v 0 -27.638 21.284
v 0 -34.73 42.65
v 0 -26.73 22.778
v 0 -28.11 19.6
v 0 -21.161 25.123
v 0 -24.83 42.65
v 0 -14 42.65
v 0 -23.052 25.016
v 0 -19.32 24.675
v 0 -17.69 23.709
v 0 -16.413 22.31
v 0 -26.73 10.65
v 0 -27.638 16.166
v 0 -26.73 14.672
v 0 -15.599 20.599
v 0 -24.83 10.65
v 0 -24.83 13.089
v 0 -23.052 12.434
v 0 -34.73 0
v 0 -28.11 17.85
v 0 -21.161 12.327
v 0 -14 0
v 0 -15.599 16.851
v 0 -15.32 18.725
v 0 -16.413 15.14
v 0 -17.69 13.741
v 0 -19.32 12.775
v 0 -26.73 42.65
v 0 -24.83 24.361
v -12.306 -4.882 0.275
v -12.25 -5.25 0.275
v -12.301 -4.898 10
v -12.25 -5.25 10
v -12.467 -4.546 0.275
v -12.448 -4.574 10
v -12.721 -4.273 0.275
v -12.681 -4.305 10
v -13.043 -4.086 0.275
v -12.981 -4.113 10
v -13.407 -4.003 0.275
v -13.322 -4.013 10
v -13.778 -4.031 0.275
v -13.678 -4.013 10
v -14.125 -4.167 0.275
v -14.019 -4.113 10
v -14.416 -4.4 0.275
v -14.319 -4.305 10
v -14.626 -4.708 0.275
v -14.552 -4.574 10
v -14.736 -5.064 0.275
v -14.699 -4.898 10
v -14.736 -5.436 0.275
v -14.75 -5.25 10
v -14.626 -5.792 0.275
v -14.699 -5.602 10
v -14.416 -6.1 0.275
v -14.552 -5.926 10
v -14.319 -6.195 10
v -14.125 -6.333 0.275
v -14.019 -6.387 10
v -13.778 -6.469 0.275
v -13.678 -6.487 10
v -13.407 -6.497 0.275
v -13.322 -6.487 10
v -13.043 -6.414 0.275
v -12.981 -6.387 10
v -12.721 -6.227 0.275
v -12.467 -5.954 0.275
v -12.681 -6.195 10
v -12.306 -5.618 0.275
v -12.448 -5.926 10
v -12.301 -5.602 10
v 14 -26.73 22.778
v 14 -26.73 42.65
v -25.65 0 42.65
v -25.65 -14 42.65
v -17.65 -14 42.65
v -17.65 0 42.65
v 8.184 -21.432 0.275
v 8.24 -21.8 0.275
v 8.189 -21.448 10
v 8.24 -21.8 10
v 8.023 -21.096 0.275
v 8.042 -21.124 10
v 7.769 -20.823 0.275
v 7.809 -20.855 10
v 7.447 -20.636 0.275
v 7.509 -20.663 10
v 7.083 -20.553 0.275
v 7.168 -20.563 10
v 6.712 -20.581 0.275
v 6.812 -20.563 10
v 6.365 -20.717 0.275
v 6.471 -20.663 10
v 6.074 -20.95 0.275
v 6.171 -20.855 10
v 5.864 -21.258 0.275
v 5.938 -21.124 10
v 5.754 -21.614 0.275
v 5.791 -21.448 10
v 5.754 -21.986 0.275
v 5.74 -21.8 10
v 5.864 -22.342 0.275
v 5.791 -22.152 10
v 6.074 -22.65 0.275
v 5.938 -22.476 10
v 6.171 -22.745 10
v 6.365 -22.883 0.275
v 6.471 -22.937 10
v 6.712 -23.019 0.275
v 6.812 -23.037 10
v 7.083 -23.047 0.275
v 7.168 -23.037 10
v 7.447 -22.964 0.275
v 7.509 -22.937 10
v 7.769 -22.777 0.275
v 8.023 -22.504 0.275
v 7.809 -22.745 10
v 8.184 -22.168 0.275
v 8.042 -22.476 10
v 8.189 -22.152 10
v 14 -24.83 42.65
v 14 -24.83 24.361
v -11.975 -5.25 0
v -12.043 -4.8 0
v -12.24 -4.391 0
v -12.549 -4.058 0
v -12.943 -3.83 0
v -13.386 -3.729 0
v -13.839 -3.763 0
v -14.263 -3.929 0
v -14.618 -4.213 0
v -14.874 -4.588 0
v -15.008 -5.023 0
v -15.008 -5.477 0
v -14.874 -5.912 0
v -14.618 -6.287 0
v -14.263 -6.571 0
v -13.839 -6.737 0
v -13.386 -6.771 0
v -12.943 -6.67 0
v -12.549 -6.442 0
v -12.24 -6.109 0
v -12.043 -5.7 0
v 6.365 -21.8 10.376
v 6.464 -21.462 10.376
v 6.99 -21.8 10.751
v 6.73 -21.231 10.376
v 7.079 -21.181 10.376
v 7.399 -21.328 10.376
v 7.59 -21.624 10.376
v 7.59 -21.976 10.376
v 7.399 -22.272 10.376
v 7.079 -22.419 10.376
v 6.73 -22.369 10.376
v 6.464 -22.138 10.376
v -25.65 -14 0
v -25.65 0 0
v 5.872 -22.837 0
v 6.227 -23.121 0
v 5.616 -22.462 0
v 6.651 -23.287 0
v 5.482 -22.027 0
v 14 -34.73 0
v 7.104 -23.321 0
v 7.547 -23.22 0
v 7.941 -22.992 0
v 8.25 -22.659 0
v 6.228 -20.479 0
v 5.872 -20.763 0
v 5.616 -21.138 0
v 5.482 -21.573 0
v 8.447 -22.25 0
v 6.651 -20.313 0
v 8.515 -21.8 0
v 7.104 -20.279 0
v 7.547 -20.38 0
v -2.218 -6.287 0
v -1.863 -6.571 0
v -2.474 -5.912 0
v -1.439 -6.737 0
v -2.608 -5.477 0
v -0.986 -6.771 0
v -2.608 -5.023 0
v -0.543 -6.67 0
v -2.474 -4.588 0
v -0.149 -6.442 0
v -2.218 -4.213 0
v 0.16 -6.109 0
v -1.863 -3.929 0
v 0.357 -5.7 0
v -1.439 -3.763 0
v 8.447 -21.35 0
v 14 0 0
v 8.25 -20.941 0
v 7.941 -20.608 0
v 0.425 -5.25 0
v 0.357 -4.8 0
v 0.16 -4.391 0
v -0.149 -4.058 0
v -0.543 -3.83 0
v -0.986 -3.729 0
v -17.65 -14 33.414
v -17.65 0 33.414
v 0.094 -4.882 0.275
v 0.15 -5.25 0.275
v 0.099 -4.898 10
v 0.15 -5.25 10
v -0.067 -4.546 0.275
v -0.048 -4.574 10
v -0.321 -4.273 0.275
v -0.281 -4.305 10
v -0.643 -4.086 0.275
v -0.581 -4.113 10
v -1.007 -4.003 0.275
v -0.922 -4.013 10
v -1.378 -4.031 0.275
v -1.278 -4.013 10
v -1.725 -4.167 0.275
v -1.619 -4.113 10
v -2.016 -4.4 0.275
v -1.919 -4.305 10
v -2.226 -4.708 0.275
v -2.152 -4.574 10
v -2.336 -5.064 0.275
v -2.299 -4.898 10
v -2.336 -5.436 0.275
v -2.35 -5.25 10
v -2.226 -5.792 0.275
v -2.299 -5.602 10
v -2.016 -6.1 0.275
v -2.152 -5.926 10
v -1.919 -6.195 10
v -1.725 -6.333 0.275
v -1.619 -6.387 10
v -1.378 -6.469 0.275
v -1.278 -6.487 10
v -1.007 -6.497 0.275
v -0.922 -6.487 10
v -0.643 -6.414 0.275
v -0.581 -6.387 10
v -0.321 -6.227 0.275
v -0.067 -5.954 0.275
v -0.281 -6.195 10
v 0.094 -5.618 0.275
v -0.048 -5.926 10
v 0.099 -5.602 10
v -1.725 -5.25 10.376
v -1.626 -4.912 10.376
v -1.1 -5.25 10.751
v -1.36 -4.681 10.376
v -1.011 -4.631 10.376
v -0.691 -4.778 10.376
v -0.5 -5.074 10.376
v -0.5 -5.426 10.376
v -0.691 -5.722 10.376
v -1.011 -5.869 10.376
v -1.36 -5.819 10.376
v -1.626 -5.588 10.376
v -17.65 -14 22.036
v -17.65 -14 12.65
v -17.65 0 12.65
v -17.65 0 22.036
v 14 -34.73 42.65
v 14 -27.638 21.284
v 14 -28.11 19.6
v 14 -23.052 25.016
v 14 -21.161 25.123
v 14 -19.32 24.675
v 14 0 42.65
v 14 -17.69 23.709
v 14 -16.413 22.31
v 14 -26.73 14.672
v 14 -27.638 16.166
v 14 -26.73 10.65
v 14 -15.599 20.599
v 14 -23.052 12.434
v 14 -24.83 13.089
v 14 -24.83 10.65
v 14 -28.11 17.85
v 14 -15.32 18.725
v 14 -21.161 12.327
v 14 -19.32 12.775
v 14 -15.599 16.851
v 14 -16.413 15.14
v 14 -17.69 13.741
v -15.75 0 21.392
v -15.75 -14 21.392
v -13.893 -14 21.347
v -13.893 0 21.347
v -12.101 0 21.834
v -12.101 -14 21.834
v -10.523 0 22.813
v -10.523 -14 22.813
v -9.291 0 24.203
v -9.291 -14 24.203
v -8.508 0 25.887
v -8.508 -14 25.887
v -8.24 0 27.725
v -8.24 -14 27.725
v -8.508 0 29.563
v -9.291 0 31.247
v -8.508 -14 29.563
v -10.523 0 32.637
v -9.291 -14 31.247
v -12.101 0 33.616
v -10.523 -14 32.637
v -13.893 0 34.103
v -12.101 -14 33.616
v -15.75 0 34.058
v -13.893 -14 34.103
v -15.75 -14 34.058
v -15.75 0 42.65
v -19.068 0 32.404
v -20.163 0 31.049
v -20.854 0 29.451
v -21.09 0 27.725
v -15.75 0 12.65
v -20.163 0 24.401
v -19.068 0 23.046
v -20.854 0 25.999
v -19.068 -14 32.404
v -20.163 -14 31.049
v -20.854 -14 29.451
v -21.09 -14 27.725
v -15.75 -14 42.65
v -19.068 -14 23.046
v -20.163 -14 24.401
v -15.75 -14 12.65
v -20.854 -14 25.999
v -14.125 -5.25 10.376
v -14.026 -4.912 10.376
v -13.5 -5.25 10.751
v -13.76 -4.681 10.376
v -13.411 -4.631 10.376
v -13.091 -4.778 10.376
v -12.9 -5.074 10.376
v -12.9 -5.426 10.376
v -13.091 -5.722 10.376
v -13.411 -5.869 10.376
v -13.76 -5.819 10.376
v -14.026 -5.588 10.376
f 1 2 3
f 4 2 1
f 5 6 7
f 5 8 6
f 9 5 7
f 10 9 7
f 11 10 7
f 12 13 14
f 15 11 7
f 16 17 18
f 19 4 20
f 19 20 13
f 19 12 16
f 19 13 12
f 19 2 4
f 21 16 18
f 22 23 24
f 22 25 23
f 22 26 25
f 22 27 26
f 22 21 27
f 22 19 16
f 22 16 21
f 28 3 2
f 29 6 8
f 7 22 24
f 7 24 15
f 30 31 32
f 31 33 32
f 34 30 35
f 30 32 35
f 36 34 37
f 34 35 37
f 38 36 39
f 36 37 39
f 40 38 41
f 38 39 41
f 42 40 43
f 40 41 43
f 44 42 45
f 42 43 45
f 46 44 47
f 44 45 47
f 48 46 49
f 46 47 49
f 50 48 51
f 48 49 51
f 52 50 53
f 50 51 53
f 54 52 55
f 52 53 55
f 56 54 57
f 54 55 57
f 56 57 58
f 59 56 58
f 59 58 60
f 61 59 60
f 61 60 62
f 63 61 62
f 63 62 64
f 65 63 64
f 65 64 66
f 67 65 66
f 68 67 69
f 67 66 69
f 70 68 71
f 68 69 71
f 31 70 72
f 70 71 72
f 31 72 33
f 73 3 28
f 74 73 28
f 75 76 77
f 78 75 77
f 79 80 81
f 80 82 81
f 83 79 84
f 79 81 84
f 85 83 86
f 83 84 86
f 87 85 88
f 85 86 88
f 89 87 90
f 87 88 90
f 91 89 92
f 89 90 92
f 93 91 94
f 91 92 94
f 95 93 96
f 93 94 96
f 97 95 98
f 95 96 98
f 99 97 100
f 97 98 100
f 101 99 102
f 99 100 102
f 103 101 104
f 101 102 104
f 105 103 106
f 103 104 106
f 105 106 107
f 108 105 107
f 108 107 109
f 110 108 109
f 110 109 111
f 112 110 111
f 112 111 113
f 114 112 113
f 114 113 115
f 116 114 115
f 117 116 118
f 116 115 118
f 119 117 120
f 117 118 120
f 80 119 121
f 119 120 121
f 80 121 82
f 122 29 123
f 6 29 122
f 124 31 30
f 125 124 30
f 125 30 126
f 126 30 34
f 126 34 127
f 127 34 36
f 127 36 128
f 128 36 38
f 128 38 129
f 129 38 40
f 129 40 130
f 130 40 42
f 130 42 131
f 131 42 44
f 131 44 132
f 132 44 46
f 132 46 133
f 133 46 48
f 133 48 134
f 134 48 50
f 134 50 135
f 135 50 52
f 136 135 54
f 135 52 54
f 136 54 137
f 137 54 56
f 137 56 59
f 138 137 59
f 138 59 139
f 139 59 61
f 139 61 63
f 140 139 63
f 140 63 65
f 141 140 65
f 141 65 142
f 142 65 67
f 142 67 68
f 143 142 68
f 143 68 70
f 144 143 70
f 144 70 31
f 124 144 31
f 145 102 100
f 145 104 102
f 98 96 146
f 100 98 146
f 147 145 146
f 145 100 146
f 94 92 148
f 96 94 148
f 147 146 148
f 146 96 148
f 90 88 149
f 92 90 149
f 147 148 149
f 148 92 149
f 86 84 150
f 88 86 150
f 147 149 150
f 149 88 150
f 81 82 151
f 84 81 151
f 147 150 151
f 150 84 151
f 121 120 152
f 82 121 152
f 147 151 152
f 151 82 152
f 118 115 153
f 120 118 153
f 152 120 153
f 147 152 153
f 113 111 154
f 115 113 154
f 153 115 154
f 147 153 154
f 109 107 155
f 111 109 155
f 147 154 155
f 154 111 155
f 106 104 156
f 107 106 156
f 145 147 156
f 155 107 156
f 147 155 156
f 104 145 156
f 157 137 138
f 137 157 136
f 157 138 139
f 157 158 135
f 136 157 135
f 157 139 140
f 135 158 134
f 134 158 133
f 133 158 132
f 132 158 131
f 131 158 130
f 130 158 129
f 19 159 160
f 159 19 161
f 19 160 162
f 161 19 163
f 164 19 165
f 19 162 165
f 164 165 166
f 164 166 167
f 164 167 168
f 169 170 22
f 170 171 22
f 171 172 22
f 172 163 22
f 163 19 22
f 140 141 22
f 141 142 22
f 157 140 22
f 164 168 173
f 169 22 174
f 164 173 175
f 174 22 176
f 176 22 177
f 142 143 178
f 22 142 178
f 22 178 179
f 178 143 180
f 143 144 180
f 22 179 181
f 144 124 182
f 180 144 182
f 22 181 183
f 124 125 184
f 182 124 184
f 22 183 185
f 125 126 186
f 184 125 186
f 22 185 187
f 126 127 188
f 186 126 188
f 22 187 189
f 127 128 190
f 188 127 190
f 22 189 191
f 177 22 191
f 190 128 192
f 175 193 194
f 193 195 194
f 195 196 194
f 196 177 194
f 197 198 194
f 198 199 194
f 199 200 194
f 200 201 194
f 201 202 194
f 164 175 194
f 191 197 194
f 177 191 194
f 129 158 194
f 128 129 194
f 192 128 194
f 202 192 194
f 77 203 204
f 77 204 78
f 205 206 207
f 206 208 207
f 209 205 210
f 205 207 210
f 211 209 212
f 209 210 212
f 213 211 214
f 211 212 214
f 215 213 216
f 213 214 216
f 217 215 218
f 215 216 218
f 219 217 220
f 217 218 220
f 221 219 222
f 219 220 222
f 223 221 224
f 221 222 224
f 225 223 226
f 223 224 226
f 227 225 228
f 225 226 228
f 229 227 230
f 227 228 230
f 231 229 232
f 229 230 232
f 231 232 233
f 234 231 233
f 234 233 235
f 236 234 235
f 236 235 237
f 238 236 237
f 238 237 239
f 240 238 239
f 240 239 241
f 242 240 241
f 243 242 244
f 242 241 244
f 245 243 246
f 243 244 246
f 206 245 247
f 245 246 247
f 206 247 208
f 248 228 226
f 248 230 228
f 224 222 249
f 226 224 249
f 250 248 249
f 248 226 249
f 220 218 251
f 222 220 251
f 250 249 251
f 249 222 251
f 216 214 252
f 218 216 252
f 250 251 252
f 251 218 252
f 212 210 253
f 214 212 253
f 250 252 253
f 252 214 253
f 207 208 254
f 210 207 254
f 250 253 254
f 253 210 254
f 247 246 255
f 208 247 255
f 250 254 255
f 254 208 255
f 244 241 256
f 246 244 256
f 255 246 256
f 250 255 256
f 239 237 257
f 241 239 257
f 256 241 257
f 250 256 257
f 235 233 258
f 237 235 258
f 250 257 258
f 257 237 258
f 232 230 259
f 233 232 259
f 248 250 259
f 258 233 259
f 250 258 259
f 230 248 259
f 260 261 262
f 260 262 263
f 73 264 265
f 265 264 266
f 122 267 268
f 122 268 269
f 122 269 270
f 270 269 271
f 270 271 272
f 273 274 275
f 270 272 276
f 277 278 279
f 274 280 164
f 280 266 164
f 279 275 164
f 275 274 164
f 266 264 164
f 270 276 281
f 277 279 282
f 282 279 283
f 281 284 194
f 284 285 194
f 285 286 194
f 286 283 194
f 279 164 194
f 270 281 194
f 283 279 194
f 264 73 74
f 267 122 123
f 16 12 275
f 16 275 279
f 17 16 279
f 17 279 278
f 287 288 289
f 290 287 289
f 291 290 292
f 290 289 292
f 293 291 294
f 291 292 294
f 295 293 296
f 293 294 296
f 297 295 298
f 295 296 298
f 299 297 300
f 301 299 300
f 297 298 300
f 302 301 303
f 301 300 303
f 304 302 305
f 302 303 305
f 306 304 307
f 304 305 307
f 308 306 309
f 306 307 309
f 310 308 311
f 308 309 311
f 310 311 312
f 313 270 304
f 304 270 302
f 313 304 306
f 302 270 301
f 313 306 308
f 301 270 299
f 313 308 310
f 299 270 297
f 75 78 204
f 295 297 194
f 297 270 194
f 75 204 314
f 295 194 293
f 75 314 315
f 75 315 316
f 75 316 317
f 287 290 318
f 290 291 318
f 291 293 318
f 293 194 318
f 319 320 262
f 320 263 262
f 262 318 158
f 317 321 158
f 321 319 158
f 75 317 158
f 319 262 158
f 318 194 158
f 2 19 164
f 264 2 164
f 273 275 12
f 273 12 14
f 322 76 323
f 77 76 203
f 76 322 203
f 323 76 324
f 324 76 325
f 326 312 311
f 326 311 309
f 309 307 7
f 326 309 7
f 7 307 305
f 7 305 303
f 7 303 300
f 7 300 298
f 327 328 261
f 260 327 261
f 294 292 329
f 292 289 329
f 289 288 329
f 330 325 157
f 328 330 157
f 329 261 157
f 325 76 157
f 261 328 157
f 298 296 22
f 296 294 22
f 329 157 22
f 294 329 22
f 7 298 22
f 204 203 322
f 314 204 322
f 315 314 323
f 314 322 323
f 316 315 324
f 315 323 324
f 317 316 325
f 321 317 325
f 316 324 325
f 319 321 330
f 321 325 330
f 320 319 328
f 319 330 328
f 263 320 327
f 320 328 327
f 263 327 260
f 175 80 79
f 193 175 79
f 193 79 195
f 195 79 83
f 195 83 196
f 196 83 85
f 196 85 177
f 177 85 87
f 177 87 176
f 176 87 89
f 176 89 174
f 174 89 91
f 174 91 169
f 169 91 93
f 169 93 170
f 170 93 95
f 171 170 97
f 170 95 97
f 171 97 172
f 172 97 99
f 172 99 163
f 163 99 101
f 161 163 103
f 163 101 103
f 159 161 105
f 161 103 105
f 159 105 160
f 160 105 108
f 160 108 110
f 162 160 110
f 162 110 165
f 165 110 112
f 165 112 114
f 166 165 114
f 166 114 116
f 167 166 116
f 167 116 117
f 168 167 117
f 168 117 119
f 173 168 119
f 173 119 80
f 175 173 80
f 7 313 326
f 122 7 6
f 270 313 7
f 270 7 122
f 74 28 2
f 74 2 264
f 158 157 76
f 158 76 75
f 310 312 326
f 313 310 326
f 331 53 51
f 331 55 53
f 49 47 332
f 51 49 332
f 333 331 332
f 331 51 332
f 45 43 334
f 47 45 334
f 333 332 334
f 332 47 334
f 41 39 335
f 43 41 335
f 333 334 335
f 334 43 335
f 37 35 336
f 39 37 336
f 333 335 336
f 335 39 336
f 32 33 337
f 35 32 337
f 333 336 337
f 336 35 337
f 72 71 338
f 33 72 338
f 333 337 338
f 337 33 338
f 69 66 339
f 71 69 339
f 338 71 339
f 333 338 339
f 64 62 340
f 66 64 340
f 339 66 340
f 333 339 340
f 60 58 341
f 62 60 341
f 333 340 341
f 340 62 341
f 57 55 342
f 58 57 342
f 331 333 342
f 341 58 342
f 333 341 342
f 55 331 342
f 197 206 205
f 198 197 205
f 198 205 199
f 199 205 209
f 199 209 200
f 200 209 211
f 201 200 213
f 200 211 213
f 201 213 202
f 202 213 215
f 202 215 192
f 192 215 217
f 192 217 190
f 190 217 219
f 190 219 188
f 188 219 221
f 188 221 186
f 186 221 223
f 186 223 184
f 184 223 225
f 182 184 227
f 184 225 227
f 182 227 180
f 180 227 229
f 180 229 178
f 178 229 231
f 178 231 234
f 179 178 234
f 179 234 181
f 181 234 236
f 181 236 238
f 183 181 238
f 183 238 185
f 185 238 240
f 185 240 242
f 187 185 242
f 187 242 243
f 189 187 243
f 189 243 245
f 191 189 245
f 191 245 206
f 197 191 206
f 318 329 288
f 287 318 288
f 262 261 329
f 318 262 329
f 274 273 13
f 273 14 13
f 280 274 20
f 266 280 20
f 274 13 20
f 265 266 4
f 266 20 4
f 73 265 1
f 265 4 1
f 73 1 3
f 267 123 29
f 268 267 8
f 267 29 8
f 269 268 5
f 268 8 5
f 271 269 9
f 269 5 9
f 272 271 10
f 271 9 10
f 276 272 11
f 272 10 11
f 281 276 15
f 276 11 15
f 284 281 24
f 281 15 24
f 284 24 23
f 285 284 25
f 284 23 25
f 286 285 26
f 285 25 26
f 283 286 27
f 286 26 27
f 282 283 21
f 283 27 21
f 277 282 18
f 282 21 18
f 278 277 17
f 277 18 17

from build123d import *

# Parameters (mm, degrees)
BOSS_EXTRUDE1_DEPTH             = 42.65
SKETCH2_R                       = 6.425
CUT_EXTRUDE1_DEPTH              = 42.65
SKETCH3_W                       = 1.9
SKETCH3_H                       = 30
CUT_EXTRUDE2_DEPTH              = 42.65
SKETCH4_R                       = 6.425
CUT_EXTRUDE3_DEPTH              = 42.65
SKETCH5_W                       = 32
SKETCH5_H                       = 1.9
CUT_EXTRUDE4_DEPTH              = 42.65
M3X0_5_TAPPED_HOLE1_D           = 2.5
M3X0_5_TAPPED_HOLE1_DEPTH       = 10
M3X0_5_TAPPED_HOLE1_CSINK_D     = 3.05
M3X0_5_TAPPED_HOLE1_CSINK_ANGLE = 90
M3X0_5_TAPPED_HOLE1_TIP         = 0.751075774


with BuildPart() as part:
    # Sketch1 → Boss-Extrude1 (new body)
    with BuildSketch(Plane.XY):
        Polygon((14, 0), (-25.65, 0), (-25.65, -14), (0, -14), (0, -34.73), (14, -34.73), align=None)
    extrude(amount=BOSS_EXTRUDE1_DEPTH)

    # Sketch2 → Cut-Extrude1 (cut)
    with BuildSketch(Plane.XZ.offset(14)):
        with Locations((-14.665, 27.725)):
            Circle(SKETCH2_R)
    extrude(amount=-CUT_EXTRUDE1_DEPTH, mode=Mode.SUBTRACT)

    # Sketch3 → Cut-Extrude2 (cut)
    with BuildSketch(Plane.XZ.offset(14)):
        with Locations((-16.7, 27.65)):
            Rectangle(SKETCH3_W, SKETCH3_H)
    extrude(amount=-CUT_EXTRUDE2_DEPTH, mode=Mode.SUBTRACT)

    # Sketch4 → Cut-Extrude3 (cut)
    with BuildSketch(Plane.ZY):
        with Locations((18.725, -21.745)):
            Circle(SKETCH4_R)
    extrude(amount=-CUT_EXTRUDE3_DEPTH, mode=Mode.SUBTRACT)

    # Sketch5 → Cut-Extrude4 (cut)
    with BuildSketch(Plane.ZY):
        with Locations((26.65, -25.78)):
            Rectangle(SKETCH5_W, SKETCH5_H)
    extrude(amount=-CUT_EXTRUDE4_DEPTH, mode=Mode.SUBTRACT)

    # M3x0.5 Tapped Hole1
    with Locations(Plane(origin=(0, 0, 0), x_dir=(-1, 0, 0), z_dir=(0, 0, -1))):
        with Locations((1.1, -5.25), (13.5, -5.25), (-6.99, -21.8)):
            CounterSinkHole(M3X0_5_TAPPED_HOLE1_D / 2, M3X0_5_TAPPED_HOLE1_CSINK_D / 2, depth=M3X0_5_TAPPED_HOLE1_DEPTH, counter_sink_angle=M3X0_5_TAPPED_HOLE1_CSINK_ANGLE)
            with Locations((0, 0, -(M3X0_5_TAPPED_HOLE1_DEPTH + M3X0_5_TAPPED_HOLE1_TIP / 2))):  # 118° drill point
                Cone(0, M3X0_5_TAPPED_HOLE1_D / 2, M3X0_5_TAPPED_HOLE1_TIP, mode=Mode.SUBTRACT)


solid = part.part
